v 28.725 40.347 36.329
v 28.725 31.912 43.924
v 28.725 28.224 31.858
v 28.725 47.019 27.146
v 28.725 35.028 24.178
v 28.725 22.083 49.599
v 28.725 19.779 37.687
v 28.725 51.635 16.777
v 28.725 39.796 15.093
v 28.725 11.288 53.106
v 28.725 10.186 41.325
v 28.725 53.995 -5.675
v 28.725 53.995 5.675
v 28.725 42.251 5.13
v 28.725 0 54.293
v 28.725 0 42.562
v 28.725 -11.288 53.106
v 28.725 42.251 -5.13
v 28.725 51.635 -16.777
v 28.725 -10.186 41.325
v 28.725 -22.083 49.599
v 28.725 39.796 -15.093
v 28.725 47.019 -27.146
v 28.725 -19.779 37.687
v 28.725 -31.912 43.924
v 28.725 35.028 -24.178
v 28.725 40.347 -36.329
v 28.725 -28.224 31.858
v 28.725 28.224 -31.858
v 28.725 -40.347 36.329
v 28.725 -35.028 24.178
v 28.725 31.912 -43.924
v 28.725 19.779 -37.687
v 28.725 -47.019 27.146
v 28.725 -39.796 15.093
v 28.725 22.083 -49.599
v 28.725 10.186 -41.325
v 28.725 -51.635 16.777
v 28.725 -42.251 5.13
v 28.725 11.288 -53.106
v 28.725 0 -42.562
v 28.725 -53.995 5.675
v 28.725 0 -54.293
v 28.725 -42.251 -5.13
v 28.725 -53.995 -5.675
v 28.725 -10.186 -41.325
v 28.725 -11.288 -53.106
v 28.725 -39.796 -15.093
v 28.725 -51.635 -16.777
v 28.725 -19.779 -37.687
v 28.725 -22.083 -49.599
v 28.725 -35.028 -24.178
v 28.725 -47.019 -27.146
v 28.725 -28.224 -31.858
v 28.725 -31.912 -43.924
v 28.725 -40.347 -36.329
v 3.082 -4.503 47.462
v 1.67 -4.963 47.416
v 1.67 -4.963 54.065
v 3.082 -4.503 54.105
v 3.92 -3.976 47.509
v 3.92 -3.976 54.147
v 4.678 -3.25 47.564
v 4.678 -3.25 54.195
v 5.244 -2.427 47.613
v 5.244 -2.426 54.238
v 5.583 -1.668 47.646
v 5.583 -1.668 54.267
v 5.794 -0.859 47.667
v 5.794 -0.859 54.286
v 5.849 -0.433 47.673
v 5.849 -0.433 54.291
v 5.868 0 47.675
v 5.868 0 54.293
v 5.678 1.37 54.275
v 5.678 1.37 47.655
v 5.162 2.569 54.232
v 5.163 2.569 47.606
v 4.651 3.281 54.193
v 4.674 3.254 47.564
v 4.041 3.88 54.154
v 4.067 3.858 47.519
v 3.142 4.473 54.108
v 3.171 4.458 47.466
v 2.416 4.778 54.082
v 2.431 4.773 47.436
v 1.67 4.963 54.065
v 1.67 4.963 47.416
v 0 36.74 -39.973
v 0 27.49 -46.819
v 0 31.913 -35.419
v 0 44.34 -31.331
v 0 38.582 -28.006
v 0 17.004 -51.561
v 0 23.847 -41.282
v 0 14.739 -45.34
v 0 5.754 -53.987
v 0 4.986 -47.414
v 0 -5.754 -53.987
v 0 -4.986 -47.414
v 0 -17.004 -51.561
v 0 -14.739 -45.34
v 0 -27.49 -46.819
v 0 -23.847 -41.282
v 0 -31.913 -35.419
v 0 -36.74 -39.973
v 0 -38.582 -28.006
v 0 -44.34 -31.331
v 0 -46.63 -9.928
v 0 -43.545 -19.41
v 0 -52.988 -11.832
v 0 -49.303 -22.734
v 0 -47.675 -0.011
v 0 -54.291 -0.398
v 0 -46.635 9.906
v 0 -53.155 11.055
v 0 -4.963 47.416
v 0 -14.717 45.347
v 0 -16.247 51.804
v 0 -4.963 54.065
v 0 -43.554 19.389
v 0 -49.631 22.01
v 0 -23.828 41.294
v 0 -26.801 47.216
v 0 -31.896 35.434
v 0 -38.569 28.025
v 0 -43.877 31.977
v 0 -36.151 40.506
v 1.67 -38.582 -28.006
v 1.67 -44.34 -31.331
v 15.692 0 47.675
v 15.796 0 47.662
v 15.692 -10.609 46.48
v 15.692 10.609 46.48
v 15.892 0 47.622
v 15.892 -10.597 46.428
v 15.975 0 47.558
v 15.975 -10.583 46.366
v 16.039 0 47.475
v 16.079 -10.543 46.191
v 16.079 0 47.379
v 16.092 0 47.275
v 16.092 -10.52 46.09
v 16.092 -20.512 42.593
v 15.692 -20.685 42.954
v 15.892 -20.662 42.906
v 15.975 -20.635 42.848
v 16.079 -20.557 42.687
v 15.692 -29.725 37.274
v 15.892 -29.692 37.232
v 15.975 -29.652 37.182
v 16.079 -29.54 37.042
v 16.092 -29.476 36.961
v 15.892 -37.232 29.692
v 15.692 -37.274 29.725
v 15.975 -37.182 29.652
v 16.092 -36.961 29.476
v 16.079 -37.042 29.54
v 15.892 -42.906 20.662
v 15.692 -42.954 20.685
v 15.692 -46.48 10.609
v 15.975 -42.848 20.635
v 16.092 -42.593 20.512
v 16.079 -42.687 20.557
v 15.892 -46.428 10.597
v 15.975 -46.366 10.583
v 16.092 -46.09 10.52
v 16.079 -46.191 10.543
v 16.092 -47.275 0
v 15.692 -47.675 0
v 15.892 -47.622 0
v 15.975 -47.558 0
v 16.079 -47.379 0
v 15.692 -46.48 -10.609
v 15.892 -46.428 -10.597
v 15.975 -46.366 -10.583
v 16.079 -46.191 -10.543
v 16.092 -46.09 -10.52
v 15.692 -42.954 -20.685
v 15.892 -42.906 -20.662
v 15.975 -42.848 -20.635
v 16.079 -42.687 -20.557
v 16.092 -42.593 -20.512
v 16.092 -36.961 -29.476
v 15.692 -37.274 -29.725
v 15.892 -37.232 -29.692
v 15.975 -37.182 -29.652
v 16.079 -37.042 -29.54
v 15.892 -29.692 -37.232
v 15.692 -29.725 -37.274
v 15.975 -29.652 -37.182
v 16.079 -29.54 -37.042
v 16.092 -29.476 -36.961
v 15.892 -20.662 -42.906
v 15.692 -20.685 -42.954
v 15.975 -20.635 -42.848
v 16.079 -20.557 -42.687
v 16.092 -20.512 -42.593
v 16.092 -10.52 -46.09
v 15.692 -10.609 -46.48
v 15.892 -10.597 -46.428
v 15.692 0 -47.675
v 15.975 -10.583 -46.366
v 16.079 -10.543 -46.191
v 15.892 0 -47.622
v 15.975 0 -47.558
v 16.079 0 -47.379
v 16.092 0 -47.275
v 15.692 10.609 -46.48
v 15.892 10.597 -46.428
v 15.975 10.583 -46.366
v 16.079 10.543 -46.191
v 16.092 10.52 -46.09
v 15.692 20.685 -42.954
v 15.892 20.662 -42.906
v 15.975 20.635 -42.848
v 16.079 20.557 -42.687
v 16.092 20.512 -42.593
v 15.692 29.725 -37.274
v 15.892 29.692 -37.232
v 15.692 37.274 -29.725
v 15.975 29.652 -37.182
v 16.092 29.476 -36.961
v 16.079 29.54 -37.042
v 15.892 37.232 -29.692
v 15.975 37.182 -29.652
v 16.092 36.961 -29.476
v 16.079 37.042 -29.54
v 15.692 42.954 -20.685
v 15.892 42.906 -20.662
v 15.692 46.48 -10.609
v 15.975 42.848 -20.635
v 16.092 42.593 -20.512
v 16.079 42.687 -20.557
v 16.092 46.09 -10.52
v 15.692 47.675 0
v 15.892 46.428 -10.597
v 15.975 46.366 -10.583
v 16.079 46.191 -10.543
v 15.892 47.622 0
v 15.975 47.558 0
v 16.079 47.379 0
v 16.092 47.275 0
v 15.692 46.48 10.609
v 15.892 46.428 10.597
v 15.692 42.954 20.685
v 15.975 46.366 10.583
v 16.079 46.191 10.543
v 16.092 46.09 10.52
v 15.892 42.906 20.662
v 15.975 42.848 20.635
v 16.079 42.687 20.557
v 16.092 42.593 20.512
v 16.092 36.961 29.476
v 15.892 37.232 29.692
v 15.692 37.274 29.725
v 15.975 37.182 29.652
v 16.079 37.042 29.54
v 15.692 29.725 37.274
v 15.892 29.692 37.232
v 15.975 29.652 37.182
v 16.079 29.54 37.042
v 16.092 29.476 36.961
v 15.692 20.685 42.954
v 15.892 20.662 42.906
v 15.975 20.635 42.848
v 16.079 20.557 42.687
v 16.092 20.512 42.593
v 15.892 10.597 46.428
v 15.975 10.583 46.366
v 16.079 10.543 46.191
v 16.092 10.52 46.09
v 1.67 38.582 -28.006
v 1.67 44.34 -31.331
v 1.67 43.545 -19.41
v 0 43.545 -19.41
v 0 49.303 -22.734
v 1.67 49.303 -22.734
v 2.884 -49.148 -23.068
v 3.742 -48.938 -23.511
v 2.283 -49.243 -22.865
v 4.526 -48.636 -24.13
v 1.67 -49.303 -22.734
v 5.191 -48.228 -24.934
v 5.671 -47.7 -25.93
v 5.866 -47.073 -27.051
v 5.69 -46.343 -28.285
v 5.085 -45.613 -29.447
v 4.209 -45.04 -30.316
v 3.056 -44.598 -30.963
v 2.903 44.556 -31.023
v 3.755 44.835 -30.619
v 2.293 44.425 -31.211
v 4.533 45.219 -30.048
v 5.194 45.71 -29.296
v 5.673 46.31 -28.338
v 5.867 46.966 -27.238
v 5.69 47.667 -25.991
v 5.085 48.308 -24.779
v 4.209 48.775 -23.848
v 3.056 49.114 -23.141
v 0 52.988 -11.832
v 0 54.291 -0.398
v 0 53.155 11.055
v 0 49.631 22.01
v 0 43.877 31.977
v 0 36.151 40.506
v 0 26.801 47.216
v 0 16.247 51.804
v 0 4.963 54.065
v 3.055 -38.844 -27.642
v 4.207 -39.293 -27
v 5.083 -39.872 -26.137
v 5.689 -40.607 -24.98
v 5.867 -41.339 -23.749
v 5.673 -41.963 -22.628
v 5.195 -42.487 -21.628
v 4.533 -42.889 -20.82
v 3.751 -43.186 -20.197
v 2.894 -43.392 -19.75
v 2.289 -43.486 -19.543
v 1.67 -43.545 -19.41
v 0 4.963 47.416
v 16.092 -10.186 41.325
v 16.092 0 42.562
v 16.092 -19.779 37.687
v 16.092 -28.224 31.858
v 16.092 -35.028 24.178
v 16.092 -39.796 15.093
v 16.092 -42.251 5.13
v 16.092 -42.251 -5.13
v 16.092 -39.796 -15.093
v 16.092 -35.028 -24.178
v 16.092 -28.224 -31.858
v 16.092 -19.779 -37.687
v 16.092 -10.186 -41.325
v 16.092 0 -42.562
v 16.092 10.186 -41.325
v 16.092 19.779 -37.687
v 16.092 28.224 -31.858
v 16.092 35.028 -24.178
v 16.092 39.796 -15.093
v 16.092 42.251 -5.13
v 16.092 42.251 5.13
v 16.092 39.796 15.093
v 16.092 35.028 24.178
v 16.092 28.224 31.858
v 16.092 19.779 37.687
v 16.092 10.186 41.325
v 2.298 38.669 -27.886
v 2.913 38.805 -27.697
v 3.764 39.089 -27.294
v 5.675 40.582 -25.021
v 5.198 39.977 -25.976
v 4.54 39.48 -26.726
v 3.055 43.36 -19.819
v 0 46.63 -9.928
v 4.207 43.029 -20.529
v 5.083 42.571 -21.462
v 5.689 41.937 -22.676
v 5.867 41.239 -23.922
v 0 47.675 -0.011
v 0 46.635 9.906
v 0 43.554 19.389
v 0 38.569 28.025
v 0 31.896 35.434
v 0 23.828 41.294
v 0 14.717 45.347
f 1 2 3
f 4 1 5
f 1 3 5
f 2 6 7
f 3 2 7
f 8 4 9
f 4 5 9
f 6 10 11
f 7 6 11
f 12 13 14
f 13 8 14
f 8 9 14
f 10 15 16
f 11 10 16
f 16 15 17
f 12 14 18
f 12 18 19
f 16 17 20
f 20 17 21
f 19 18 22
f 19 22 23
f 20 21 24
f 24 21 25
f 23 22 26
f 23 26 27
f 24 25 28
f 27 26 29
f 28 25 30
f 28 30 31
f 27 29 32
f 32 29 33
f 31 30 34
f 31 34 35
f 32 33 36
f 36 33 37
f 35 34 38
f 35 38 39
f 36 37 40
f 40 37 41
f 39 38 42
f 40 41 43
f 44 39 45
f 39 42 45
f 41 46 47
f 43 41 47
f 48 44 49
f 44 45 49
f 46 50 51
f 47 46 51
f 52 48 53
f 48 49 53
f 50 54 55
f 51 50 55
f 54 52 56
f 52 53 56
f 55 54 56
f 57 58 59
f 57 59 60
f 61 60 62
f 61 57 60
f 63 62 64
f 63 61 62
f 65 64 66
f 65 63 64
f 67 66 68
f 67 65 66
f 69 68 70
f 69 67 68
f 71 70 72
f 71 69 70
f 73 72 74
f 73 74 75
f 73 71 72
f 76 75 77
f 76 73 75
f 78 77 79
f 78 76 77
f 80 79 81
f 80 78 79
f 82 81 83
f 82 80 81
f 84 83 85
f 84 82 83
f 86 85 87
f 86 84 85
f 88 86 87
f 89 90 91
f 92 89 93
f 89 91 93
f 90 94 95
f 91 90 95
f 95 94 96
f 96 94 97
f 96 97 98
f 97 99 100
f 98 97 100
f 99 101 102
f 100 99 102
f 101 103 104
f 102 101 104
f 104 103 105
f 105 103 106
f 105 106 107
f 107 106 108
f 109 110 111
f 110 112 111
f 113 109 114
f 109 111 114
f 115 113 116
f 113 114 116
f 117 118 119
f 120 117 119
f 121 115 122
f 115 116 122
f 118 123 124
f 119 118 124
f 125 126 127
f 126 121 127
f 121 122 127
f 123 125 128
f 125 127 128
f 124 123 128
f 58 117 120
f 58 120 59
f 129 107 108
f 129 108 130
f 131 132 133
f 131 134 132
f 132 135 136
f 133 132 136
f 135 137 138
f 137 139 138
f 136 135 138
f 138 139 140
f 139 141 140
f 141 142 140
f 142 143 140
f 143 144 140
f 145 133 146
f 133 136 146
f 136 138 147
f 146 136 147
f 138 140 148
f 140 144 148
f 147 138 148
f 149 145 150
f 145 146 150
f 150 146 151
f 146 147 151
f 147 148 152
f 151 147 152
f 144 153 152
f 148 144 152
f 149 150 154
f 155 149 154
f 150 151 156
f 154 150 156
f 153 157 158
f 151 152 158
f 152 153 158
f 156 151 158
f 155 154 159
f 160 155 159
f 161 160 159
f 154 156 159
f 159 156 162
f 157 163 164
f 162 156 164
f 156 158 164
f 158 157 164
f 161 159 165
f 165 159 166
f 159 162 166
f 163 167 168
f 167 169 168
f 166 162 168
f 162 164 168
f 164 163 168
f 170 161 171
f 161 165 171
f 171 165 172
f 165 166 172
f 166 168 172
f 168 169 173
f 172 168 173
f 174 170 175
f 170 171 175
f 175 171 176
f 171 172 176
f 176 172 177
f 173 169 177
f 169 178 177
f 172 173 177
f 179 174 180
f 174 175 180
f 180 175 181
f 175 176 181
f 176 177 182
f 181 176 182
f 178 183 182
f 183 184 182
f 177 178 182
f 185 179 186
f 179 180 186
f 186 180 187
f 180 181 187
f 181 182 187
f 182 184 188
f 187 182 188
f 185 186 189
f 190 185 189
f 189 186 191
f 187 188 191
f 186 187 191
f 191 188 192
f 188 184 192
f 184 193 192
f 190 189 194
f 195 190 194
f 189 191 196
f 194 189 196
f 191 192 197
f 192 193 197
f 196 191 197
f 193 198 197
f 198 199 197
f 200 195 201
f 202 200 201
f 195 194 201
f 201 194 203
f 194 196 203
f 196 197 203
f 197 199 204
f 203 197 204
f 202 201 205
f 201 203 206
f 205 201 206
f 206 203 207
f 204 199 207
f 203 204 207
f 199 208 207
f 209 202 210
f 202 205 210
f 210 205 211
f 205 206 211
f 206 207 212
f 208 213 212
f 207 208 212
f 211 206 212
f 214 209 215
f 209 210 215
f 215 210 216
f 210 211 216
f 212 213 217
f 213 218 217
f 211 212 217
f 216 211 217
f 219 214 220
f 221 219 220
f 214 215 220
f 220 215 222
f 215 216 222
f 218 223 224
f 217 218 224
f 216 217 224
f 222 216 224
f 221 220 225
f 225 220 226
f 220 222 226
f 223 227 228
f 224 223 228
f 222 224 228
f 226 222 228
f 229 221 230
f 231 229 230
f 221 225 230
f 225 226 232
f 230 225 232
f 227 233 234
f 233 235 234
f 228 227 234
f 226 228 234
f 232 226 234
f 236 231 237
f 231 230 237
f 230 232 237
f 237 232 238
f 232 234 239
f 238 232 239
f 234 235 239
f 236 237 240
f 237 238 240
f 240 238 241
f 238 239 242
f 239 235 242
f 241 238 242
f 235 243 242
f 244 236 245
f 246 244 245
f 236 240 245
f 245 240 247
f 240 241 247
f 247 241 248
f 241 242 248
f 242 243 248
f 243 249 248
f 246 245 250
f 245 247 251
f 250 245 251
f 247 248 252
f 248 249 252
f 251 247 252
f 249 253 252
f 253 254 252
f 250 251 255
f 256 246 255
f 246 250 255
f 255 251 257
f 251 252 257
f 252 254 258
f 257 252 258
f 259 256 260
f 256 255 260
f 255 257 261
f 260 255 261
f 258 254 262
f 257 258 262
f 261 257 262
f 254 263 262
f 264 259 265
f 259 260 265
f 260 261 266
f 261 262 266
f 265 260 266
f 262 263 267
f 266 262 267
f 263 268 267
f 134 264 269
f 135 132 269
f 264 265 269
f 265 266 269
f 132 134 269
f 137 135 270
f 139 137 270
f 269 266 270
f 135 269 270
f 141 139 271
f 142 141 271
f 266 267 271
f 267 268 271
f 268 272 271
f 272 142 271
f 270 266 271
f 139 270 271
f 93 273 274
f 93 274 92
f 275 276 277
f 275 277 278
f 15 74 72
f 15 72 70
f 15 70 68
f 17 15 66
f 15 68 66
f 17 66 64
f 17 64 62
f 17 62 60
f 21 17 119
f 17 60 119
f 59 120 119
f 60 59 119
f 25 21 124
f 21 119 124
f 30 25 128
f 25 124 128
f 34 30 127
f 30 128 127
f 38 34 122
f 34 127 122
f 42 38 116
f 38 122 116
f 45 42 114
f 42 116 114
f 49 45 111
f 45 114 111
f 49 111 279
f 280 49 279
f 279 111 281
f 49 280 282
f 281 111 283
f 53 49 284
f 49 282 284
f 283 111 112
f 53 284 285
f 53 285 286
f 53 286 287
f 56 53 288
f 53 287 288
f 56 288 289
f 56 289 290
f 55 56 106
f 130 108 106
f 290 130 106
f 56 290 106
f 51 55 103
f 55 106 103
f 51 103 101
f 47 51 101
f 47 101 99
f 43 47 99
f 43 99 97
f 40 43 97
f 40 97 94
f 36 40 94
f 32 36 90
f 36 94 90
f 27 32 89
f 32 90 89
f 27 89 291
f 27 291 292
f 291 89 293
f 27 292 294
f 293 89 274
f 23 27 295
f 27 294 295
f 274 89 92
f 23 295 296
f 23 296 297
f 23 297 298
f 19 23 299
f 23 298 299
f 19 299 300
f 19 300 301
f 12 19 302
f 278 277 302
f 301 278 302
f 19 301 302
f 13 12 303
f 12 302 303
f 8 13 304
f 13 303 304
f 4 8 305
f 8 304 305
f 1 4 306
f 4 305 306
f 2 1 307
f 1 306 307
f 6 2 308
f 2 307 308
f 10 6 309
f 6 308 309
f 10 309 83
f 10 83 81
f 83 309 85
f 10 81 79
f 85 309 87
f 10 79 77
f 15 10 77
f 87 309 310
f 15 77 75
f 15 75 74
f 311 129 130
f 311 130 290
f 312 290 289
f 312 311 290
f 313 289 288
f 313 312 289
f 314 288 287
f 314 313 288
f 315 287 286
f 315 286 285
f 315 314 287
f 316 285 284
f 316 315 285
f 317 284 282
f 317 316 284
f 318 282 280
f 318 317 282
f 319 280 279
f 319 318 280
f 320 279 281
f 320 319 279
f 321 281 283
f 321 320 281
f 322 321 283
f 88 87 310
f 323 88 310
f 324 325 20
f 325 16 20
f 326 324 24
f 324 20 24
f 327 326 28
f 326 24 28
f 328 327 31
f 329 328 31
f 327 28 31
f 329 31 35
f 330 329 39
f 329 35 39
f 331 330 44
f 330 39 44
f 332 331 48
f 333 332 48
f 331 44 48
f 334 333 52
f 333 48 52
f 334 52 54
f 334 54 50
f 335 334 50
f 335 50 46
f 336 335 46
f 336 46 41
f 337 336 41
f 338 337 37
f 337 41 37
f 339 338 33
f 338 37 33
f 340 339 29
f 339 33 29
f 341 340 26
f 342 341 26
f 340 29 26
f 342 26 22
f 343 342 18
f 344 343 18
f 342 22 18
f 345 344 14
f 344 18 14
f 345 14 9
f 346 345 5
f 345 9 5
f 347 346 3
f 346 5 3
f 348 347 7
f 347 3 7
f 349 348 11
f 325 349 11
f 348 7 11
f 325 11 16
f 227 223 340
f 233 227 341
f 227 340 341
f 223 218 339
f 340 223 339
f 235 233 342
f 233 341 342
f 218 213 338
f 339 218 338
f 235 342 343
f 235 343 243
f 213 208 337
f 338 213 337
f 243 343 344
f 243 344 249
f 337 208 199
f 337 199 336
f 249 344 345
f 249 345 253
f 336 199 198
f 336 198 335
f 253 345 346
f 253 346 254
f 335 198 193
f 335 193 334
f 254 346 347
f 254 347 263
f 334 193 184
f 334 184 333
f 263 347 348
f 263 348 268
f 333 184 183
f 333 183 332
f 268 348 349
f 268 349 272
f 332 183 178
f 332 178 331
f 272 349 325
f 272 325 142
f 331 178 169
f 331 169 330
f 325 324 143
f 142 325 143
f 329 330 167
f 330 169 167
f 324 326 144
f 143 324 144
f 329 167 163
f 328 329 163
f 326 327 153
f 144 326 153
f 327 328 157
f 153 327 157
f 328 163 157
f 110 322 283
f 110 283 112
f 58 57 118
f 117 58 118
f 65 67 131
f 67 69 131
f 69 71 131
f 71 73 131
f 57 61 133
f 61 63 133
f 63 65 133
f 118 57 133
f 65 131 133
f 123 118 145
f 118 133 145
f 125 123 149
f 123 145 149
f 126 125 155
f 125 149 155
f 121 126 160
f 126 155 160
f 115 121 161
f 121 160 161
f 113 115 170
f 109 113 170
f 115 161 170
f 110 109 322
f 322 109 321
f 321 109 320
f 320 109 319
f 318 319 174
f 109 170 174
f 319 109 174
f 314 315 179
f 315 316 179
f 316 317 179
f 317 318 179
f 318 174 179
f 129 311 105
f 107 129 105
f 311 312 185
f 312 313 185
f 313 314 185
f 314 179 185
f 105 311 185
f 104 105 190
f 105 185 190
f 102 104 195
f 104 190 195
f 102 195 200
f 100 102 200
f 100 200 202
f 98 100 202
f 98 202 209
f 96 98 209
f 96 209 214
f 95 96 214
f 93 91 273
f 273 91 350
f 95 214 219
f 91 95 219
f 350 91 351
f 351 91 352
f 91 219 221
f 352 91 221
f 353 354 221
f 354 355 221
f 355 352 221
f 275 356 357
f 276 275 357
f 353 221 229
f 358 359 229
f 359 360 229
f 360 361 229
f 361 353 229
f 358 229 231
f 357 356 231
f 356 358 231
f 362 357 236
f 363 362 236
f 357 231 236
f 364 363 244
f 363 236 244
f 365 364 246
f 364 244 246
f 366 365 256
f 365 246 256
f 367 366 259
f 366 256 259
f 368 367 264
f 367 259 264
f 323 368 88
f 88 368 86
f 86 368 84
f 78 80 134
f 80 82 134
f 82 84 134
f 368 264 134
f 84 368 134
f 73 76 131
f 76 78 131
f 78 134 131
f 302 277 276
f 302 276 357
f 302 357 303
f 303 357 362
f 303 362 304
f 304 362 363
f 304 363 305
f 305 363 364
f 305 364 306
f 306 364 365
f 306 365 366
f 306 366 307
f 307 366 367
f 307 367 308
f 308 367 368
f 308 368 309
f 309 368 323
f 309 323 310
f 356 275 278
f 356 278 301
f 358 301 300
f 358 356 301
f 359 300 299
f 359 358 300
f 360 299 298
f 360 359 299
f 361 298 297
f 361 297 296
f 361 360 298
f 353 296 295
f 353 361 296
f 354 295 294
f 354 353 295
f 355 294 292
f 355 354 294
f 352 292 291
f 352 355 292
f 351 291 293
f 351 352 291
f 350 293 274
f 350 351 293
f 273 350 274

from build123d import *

# Parameters (mm, degrees)
F3_DEPTH        = 73.66
F3_COPIES_COUNT = 3
F4_R            = 0.4


# Not quite as in the source:
# - a pattern or mirror of a feature is missing from the dataset's text; its kind, count and spacing are read off the source's solid


with BuildPart() as f1:
    # F0 (on Front) → F1 (revolve)
    with BuildSketch(Plane.XZ):
        Polygon((28.7253968418, 54.2925000191), (0, 54.2925000191), (0, 47.6751327515), (16.0922370851, 47.6751327515), (16.0922370851, 42.5617098808), (28.7253968418, 42.5617098808), align=None)
    revolve(axis=Axis((14.3626984209, 0, 0), (1, 0, 0)))

    # F2 (on Top) → F3 (cut)
    with BuildSketch(Plane.XY):
        with BuildLine():
            Line((1.6697708597, 4.963026382), (0, 4.963026382))
            Line((0, 4.963026382), (-7.0685544051, 4.963026382))
            Line((-7.0685544051, 4.963026382), (-7.0685544051, -4.963026382))
            Line((-7.0685544051, -4.963026382), (0, -4.963026382))
            Line((0, -4.963026382), (1.6697708597, -4.963026382))
            ThreePointArc((1.6697708597, -4.963026382), (5.8676445687, 0), (1.6697708597, 4.963026382))
        make_face()
    f3 = extrude(amount=F3_DEPTH, mode=Mode.SUBTRACT)

    # F3_copies: F3 ×3 about axis
    f3_copies_axis = Axis((0, 0, 0), (1, 0, 0))
    for i in range(1, F3_COPIES_COUNT):
        add(f3.rotate(f3_copies_axis, i * 360 / F3_COPIES_COUNT), mode=Mode.SUBTRACT)

    # F4
    f4_edges = [f1.edges().sort_by_distance(p)[0] for p in [
        (16.092237, 0, -47.675133),
    ]]
    fillet(f4_edges, radius=F4_R)


solid = f1.part
